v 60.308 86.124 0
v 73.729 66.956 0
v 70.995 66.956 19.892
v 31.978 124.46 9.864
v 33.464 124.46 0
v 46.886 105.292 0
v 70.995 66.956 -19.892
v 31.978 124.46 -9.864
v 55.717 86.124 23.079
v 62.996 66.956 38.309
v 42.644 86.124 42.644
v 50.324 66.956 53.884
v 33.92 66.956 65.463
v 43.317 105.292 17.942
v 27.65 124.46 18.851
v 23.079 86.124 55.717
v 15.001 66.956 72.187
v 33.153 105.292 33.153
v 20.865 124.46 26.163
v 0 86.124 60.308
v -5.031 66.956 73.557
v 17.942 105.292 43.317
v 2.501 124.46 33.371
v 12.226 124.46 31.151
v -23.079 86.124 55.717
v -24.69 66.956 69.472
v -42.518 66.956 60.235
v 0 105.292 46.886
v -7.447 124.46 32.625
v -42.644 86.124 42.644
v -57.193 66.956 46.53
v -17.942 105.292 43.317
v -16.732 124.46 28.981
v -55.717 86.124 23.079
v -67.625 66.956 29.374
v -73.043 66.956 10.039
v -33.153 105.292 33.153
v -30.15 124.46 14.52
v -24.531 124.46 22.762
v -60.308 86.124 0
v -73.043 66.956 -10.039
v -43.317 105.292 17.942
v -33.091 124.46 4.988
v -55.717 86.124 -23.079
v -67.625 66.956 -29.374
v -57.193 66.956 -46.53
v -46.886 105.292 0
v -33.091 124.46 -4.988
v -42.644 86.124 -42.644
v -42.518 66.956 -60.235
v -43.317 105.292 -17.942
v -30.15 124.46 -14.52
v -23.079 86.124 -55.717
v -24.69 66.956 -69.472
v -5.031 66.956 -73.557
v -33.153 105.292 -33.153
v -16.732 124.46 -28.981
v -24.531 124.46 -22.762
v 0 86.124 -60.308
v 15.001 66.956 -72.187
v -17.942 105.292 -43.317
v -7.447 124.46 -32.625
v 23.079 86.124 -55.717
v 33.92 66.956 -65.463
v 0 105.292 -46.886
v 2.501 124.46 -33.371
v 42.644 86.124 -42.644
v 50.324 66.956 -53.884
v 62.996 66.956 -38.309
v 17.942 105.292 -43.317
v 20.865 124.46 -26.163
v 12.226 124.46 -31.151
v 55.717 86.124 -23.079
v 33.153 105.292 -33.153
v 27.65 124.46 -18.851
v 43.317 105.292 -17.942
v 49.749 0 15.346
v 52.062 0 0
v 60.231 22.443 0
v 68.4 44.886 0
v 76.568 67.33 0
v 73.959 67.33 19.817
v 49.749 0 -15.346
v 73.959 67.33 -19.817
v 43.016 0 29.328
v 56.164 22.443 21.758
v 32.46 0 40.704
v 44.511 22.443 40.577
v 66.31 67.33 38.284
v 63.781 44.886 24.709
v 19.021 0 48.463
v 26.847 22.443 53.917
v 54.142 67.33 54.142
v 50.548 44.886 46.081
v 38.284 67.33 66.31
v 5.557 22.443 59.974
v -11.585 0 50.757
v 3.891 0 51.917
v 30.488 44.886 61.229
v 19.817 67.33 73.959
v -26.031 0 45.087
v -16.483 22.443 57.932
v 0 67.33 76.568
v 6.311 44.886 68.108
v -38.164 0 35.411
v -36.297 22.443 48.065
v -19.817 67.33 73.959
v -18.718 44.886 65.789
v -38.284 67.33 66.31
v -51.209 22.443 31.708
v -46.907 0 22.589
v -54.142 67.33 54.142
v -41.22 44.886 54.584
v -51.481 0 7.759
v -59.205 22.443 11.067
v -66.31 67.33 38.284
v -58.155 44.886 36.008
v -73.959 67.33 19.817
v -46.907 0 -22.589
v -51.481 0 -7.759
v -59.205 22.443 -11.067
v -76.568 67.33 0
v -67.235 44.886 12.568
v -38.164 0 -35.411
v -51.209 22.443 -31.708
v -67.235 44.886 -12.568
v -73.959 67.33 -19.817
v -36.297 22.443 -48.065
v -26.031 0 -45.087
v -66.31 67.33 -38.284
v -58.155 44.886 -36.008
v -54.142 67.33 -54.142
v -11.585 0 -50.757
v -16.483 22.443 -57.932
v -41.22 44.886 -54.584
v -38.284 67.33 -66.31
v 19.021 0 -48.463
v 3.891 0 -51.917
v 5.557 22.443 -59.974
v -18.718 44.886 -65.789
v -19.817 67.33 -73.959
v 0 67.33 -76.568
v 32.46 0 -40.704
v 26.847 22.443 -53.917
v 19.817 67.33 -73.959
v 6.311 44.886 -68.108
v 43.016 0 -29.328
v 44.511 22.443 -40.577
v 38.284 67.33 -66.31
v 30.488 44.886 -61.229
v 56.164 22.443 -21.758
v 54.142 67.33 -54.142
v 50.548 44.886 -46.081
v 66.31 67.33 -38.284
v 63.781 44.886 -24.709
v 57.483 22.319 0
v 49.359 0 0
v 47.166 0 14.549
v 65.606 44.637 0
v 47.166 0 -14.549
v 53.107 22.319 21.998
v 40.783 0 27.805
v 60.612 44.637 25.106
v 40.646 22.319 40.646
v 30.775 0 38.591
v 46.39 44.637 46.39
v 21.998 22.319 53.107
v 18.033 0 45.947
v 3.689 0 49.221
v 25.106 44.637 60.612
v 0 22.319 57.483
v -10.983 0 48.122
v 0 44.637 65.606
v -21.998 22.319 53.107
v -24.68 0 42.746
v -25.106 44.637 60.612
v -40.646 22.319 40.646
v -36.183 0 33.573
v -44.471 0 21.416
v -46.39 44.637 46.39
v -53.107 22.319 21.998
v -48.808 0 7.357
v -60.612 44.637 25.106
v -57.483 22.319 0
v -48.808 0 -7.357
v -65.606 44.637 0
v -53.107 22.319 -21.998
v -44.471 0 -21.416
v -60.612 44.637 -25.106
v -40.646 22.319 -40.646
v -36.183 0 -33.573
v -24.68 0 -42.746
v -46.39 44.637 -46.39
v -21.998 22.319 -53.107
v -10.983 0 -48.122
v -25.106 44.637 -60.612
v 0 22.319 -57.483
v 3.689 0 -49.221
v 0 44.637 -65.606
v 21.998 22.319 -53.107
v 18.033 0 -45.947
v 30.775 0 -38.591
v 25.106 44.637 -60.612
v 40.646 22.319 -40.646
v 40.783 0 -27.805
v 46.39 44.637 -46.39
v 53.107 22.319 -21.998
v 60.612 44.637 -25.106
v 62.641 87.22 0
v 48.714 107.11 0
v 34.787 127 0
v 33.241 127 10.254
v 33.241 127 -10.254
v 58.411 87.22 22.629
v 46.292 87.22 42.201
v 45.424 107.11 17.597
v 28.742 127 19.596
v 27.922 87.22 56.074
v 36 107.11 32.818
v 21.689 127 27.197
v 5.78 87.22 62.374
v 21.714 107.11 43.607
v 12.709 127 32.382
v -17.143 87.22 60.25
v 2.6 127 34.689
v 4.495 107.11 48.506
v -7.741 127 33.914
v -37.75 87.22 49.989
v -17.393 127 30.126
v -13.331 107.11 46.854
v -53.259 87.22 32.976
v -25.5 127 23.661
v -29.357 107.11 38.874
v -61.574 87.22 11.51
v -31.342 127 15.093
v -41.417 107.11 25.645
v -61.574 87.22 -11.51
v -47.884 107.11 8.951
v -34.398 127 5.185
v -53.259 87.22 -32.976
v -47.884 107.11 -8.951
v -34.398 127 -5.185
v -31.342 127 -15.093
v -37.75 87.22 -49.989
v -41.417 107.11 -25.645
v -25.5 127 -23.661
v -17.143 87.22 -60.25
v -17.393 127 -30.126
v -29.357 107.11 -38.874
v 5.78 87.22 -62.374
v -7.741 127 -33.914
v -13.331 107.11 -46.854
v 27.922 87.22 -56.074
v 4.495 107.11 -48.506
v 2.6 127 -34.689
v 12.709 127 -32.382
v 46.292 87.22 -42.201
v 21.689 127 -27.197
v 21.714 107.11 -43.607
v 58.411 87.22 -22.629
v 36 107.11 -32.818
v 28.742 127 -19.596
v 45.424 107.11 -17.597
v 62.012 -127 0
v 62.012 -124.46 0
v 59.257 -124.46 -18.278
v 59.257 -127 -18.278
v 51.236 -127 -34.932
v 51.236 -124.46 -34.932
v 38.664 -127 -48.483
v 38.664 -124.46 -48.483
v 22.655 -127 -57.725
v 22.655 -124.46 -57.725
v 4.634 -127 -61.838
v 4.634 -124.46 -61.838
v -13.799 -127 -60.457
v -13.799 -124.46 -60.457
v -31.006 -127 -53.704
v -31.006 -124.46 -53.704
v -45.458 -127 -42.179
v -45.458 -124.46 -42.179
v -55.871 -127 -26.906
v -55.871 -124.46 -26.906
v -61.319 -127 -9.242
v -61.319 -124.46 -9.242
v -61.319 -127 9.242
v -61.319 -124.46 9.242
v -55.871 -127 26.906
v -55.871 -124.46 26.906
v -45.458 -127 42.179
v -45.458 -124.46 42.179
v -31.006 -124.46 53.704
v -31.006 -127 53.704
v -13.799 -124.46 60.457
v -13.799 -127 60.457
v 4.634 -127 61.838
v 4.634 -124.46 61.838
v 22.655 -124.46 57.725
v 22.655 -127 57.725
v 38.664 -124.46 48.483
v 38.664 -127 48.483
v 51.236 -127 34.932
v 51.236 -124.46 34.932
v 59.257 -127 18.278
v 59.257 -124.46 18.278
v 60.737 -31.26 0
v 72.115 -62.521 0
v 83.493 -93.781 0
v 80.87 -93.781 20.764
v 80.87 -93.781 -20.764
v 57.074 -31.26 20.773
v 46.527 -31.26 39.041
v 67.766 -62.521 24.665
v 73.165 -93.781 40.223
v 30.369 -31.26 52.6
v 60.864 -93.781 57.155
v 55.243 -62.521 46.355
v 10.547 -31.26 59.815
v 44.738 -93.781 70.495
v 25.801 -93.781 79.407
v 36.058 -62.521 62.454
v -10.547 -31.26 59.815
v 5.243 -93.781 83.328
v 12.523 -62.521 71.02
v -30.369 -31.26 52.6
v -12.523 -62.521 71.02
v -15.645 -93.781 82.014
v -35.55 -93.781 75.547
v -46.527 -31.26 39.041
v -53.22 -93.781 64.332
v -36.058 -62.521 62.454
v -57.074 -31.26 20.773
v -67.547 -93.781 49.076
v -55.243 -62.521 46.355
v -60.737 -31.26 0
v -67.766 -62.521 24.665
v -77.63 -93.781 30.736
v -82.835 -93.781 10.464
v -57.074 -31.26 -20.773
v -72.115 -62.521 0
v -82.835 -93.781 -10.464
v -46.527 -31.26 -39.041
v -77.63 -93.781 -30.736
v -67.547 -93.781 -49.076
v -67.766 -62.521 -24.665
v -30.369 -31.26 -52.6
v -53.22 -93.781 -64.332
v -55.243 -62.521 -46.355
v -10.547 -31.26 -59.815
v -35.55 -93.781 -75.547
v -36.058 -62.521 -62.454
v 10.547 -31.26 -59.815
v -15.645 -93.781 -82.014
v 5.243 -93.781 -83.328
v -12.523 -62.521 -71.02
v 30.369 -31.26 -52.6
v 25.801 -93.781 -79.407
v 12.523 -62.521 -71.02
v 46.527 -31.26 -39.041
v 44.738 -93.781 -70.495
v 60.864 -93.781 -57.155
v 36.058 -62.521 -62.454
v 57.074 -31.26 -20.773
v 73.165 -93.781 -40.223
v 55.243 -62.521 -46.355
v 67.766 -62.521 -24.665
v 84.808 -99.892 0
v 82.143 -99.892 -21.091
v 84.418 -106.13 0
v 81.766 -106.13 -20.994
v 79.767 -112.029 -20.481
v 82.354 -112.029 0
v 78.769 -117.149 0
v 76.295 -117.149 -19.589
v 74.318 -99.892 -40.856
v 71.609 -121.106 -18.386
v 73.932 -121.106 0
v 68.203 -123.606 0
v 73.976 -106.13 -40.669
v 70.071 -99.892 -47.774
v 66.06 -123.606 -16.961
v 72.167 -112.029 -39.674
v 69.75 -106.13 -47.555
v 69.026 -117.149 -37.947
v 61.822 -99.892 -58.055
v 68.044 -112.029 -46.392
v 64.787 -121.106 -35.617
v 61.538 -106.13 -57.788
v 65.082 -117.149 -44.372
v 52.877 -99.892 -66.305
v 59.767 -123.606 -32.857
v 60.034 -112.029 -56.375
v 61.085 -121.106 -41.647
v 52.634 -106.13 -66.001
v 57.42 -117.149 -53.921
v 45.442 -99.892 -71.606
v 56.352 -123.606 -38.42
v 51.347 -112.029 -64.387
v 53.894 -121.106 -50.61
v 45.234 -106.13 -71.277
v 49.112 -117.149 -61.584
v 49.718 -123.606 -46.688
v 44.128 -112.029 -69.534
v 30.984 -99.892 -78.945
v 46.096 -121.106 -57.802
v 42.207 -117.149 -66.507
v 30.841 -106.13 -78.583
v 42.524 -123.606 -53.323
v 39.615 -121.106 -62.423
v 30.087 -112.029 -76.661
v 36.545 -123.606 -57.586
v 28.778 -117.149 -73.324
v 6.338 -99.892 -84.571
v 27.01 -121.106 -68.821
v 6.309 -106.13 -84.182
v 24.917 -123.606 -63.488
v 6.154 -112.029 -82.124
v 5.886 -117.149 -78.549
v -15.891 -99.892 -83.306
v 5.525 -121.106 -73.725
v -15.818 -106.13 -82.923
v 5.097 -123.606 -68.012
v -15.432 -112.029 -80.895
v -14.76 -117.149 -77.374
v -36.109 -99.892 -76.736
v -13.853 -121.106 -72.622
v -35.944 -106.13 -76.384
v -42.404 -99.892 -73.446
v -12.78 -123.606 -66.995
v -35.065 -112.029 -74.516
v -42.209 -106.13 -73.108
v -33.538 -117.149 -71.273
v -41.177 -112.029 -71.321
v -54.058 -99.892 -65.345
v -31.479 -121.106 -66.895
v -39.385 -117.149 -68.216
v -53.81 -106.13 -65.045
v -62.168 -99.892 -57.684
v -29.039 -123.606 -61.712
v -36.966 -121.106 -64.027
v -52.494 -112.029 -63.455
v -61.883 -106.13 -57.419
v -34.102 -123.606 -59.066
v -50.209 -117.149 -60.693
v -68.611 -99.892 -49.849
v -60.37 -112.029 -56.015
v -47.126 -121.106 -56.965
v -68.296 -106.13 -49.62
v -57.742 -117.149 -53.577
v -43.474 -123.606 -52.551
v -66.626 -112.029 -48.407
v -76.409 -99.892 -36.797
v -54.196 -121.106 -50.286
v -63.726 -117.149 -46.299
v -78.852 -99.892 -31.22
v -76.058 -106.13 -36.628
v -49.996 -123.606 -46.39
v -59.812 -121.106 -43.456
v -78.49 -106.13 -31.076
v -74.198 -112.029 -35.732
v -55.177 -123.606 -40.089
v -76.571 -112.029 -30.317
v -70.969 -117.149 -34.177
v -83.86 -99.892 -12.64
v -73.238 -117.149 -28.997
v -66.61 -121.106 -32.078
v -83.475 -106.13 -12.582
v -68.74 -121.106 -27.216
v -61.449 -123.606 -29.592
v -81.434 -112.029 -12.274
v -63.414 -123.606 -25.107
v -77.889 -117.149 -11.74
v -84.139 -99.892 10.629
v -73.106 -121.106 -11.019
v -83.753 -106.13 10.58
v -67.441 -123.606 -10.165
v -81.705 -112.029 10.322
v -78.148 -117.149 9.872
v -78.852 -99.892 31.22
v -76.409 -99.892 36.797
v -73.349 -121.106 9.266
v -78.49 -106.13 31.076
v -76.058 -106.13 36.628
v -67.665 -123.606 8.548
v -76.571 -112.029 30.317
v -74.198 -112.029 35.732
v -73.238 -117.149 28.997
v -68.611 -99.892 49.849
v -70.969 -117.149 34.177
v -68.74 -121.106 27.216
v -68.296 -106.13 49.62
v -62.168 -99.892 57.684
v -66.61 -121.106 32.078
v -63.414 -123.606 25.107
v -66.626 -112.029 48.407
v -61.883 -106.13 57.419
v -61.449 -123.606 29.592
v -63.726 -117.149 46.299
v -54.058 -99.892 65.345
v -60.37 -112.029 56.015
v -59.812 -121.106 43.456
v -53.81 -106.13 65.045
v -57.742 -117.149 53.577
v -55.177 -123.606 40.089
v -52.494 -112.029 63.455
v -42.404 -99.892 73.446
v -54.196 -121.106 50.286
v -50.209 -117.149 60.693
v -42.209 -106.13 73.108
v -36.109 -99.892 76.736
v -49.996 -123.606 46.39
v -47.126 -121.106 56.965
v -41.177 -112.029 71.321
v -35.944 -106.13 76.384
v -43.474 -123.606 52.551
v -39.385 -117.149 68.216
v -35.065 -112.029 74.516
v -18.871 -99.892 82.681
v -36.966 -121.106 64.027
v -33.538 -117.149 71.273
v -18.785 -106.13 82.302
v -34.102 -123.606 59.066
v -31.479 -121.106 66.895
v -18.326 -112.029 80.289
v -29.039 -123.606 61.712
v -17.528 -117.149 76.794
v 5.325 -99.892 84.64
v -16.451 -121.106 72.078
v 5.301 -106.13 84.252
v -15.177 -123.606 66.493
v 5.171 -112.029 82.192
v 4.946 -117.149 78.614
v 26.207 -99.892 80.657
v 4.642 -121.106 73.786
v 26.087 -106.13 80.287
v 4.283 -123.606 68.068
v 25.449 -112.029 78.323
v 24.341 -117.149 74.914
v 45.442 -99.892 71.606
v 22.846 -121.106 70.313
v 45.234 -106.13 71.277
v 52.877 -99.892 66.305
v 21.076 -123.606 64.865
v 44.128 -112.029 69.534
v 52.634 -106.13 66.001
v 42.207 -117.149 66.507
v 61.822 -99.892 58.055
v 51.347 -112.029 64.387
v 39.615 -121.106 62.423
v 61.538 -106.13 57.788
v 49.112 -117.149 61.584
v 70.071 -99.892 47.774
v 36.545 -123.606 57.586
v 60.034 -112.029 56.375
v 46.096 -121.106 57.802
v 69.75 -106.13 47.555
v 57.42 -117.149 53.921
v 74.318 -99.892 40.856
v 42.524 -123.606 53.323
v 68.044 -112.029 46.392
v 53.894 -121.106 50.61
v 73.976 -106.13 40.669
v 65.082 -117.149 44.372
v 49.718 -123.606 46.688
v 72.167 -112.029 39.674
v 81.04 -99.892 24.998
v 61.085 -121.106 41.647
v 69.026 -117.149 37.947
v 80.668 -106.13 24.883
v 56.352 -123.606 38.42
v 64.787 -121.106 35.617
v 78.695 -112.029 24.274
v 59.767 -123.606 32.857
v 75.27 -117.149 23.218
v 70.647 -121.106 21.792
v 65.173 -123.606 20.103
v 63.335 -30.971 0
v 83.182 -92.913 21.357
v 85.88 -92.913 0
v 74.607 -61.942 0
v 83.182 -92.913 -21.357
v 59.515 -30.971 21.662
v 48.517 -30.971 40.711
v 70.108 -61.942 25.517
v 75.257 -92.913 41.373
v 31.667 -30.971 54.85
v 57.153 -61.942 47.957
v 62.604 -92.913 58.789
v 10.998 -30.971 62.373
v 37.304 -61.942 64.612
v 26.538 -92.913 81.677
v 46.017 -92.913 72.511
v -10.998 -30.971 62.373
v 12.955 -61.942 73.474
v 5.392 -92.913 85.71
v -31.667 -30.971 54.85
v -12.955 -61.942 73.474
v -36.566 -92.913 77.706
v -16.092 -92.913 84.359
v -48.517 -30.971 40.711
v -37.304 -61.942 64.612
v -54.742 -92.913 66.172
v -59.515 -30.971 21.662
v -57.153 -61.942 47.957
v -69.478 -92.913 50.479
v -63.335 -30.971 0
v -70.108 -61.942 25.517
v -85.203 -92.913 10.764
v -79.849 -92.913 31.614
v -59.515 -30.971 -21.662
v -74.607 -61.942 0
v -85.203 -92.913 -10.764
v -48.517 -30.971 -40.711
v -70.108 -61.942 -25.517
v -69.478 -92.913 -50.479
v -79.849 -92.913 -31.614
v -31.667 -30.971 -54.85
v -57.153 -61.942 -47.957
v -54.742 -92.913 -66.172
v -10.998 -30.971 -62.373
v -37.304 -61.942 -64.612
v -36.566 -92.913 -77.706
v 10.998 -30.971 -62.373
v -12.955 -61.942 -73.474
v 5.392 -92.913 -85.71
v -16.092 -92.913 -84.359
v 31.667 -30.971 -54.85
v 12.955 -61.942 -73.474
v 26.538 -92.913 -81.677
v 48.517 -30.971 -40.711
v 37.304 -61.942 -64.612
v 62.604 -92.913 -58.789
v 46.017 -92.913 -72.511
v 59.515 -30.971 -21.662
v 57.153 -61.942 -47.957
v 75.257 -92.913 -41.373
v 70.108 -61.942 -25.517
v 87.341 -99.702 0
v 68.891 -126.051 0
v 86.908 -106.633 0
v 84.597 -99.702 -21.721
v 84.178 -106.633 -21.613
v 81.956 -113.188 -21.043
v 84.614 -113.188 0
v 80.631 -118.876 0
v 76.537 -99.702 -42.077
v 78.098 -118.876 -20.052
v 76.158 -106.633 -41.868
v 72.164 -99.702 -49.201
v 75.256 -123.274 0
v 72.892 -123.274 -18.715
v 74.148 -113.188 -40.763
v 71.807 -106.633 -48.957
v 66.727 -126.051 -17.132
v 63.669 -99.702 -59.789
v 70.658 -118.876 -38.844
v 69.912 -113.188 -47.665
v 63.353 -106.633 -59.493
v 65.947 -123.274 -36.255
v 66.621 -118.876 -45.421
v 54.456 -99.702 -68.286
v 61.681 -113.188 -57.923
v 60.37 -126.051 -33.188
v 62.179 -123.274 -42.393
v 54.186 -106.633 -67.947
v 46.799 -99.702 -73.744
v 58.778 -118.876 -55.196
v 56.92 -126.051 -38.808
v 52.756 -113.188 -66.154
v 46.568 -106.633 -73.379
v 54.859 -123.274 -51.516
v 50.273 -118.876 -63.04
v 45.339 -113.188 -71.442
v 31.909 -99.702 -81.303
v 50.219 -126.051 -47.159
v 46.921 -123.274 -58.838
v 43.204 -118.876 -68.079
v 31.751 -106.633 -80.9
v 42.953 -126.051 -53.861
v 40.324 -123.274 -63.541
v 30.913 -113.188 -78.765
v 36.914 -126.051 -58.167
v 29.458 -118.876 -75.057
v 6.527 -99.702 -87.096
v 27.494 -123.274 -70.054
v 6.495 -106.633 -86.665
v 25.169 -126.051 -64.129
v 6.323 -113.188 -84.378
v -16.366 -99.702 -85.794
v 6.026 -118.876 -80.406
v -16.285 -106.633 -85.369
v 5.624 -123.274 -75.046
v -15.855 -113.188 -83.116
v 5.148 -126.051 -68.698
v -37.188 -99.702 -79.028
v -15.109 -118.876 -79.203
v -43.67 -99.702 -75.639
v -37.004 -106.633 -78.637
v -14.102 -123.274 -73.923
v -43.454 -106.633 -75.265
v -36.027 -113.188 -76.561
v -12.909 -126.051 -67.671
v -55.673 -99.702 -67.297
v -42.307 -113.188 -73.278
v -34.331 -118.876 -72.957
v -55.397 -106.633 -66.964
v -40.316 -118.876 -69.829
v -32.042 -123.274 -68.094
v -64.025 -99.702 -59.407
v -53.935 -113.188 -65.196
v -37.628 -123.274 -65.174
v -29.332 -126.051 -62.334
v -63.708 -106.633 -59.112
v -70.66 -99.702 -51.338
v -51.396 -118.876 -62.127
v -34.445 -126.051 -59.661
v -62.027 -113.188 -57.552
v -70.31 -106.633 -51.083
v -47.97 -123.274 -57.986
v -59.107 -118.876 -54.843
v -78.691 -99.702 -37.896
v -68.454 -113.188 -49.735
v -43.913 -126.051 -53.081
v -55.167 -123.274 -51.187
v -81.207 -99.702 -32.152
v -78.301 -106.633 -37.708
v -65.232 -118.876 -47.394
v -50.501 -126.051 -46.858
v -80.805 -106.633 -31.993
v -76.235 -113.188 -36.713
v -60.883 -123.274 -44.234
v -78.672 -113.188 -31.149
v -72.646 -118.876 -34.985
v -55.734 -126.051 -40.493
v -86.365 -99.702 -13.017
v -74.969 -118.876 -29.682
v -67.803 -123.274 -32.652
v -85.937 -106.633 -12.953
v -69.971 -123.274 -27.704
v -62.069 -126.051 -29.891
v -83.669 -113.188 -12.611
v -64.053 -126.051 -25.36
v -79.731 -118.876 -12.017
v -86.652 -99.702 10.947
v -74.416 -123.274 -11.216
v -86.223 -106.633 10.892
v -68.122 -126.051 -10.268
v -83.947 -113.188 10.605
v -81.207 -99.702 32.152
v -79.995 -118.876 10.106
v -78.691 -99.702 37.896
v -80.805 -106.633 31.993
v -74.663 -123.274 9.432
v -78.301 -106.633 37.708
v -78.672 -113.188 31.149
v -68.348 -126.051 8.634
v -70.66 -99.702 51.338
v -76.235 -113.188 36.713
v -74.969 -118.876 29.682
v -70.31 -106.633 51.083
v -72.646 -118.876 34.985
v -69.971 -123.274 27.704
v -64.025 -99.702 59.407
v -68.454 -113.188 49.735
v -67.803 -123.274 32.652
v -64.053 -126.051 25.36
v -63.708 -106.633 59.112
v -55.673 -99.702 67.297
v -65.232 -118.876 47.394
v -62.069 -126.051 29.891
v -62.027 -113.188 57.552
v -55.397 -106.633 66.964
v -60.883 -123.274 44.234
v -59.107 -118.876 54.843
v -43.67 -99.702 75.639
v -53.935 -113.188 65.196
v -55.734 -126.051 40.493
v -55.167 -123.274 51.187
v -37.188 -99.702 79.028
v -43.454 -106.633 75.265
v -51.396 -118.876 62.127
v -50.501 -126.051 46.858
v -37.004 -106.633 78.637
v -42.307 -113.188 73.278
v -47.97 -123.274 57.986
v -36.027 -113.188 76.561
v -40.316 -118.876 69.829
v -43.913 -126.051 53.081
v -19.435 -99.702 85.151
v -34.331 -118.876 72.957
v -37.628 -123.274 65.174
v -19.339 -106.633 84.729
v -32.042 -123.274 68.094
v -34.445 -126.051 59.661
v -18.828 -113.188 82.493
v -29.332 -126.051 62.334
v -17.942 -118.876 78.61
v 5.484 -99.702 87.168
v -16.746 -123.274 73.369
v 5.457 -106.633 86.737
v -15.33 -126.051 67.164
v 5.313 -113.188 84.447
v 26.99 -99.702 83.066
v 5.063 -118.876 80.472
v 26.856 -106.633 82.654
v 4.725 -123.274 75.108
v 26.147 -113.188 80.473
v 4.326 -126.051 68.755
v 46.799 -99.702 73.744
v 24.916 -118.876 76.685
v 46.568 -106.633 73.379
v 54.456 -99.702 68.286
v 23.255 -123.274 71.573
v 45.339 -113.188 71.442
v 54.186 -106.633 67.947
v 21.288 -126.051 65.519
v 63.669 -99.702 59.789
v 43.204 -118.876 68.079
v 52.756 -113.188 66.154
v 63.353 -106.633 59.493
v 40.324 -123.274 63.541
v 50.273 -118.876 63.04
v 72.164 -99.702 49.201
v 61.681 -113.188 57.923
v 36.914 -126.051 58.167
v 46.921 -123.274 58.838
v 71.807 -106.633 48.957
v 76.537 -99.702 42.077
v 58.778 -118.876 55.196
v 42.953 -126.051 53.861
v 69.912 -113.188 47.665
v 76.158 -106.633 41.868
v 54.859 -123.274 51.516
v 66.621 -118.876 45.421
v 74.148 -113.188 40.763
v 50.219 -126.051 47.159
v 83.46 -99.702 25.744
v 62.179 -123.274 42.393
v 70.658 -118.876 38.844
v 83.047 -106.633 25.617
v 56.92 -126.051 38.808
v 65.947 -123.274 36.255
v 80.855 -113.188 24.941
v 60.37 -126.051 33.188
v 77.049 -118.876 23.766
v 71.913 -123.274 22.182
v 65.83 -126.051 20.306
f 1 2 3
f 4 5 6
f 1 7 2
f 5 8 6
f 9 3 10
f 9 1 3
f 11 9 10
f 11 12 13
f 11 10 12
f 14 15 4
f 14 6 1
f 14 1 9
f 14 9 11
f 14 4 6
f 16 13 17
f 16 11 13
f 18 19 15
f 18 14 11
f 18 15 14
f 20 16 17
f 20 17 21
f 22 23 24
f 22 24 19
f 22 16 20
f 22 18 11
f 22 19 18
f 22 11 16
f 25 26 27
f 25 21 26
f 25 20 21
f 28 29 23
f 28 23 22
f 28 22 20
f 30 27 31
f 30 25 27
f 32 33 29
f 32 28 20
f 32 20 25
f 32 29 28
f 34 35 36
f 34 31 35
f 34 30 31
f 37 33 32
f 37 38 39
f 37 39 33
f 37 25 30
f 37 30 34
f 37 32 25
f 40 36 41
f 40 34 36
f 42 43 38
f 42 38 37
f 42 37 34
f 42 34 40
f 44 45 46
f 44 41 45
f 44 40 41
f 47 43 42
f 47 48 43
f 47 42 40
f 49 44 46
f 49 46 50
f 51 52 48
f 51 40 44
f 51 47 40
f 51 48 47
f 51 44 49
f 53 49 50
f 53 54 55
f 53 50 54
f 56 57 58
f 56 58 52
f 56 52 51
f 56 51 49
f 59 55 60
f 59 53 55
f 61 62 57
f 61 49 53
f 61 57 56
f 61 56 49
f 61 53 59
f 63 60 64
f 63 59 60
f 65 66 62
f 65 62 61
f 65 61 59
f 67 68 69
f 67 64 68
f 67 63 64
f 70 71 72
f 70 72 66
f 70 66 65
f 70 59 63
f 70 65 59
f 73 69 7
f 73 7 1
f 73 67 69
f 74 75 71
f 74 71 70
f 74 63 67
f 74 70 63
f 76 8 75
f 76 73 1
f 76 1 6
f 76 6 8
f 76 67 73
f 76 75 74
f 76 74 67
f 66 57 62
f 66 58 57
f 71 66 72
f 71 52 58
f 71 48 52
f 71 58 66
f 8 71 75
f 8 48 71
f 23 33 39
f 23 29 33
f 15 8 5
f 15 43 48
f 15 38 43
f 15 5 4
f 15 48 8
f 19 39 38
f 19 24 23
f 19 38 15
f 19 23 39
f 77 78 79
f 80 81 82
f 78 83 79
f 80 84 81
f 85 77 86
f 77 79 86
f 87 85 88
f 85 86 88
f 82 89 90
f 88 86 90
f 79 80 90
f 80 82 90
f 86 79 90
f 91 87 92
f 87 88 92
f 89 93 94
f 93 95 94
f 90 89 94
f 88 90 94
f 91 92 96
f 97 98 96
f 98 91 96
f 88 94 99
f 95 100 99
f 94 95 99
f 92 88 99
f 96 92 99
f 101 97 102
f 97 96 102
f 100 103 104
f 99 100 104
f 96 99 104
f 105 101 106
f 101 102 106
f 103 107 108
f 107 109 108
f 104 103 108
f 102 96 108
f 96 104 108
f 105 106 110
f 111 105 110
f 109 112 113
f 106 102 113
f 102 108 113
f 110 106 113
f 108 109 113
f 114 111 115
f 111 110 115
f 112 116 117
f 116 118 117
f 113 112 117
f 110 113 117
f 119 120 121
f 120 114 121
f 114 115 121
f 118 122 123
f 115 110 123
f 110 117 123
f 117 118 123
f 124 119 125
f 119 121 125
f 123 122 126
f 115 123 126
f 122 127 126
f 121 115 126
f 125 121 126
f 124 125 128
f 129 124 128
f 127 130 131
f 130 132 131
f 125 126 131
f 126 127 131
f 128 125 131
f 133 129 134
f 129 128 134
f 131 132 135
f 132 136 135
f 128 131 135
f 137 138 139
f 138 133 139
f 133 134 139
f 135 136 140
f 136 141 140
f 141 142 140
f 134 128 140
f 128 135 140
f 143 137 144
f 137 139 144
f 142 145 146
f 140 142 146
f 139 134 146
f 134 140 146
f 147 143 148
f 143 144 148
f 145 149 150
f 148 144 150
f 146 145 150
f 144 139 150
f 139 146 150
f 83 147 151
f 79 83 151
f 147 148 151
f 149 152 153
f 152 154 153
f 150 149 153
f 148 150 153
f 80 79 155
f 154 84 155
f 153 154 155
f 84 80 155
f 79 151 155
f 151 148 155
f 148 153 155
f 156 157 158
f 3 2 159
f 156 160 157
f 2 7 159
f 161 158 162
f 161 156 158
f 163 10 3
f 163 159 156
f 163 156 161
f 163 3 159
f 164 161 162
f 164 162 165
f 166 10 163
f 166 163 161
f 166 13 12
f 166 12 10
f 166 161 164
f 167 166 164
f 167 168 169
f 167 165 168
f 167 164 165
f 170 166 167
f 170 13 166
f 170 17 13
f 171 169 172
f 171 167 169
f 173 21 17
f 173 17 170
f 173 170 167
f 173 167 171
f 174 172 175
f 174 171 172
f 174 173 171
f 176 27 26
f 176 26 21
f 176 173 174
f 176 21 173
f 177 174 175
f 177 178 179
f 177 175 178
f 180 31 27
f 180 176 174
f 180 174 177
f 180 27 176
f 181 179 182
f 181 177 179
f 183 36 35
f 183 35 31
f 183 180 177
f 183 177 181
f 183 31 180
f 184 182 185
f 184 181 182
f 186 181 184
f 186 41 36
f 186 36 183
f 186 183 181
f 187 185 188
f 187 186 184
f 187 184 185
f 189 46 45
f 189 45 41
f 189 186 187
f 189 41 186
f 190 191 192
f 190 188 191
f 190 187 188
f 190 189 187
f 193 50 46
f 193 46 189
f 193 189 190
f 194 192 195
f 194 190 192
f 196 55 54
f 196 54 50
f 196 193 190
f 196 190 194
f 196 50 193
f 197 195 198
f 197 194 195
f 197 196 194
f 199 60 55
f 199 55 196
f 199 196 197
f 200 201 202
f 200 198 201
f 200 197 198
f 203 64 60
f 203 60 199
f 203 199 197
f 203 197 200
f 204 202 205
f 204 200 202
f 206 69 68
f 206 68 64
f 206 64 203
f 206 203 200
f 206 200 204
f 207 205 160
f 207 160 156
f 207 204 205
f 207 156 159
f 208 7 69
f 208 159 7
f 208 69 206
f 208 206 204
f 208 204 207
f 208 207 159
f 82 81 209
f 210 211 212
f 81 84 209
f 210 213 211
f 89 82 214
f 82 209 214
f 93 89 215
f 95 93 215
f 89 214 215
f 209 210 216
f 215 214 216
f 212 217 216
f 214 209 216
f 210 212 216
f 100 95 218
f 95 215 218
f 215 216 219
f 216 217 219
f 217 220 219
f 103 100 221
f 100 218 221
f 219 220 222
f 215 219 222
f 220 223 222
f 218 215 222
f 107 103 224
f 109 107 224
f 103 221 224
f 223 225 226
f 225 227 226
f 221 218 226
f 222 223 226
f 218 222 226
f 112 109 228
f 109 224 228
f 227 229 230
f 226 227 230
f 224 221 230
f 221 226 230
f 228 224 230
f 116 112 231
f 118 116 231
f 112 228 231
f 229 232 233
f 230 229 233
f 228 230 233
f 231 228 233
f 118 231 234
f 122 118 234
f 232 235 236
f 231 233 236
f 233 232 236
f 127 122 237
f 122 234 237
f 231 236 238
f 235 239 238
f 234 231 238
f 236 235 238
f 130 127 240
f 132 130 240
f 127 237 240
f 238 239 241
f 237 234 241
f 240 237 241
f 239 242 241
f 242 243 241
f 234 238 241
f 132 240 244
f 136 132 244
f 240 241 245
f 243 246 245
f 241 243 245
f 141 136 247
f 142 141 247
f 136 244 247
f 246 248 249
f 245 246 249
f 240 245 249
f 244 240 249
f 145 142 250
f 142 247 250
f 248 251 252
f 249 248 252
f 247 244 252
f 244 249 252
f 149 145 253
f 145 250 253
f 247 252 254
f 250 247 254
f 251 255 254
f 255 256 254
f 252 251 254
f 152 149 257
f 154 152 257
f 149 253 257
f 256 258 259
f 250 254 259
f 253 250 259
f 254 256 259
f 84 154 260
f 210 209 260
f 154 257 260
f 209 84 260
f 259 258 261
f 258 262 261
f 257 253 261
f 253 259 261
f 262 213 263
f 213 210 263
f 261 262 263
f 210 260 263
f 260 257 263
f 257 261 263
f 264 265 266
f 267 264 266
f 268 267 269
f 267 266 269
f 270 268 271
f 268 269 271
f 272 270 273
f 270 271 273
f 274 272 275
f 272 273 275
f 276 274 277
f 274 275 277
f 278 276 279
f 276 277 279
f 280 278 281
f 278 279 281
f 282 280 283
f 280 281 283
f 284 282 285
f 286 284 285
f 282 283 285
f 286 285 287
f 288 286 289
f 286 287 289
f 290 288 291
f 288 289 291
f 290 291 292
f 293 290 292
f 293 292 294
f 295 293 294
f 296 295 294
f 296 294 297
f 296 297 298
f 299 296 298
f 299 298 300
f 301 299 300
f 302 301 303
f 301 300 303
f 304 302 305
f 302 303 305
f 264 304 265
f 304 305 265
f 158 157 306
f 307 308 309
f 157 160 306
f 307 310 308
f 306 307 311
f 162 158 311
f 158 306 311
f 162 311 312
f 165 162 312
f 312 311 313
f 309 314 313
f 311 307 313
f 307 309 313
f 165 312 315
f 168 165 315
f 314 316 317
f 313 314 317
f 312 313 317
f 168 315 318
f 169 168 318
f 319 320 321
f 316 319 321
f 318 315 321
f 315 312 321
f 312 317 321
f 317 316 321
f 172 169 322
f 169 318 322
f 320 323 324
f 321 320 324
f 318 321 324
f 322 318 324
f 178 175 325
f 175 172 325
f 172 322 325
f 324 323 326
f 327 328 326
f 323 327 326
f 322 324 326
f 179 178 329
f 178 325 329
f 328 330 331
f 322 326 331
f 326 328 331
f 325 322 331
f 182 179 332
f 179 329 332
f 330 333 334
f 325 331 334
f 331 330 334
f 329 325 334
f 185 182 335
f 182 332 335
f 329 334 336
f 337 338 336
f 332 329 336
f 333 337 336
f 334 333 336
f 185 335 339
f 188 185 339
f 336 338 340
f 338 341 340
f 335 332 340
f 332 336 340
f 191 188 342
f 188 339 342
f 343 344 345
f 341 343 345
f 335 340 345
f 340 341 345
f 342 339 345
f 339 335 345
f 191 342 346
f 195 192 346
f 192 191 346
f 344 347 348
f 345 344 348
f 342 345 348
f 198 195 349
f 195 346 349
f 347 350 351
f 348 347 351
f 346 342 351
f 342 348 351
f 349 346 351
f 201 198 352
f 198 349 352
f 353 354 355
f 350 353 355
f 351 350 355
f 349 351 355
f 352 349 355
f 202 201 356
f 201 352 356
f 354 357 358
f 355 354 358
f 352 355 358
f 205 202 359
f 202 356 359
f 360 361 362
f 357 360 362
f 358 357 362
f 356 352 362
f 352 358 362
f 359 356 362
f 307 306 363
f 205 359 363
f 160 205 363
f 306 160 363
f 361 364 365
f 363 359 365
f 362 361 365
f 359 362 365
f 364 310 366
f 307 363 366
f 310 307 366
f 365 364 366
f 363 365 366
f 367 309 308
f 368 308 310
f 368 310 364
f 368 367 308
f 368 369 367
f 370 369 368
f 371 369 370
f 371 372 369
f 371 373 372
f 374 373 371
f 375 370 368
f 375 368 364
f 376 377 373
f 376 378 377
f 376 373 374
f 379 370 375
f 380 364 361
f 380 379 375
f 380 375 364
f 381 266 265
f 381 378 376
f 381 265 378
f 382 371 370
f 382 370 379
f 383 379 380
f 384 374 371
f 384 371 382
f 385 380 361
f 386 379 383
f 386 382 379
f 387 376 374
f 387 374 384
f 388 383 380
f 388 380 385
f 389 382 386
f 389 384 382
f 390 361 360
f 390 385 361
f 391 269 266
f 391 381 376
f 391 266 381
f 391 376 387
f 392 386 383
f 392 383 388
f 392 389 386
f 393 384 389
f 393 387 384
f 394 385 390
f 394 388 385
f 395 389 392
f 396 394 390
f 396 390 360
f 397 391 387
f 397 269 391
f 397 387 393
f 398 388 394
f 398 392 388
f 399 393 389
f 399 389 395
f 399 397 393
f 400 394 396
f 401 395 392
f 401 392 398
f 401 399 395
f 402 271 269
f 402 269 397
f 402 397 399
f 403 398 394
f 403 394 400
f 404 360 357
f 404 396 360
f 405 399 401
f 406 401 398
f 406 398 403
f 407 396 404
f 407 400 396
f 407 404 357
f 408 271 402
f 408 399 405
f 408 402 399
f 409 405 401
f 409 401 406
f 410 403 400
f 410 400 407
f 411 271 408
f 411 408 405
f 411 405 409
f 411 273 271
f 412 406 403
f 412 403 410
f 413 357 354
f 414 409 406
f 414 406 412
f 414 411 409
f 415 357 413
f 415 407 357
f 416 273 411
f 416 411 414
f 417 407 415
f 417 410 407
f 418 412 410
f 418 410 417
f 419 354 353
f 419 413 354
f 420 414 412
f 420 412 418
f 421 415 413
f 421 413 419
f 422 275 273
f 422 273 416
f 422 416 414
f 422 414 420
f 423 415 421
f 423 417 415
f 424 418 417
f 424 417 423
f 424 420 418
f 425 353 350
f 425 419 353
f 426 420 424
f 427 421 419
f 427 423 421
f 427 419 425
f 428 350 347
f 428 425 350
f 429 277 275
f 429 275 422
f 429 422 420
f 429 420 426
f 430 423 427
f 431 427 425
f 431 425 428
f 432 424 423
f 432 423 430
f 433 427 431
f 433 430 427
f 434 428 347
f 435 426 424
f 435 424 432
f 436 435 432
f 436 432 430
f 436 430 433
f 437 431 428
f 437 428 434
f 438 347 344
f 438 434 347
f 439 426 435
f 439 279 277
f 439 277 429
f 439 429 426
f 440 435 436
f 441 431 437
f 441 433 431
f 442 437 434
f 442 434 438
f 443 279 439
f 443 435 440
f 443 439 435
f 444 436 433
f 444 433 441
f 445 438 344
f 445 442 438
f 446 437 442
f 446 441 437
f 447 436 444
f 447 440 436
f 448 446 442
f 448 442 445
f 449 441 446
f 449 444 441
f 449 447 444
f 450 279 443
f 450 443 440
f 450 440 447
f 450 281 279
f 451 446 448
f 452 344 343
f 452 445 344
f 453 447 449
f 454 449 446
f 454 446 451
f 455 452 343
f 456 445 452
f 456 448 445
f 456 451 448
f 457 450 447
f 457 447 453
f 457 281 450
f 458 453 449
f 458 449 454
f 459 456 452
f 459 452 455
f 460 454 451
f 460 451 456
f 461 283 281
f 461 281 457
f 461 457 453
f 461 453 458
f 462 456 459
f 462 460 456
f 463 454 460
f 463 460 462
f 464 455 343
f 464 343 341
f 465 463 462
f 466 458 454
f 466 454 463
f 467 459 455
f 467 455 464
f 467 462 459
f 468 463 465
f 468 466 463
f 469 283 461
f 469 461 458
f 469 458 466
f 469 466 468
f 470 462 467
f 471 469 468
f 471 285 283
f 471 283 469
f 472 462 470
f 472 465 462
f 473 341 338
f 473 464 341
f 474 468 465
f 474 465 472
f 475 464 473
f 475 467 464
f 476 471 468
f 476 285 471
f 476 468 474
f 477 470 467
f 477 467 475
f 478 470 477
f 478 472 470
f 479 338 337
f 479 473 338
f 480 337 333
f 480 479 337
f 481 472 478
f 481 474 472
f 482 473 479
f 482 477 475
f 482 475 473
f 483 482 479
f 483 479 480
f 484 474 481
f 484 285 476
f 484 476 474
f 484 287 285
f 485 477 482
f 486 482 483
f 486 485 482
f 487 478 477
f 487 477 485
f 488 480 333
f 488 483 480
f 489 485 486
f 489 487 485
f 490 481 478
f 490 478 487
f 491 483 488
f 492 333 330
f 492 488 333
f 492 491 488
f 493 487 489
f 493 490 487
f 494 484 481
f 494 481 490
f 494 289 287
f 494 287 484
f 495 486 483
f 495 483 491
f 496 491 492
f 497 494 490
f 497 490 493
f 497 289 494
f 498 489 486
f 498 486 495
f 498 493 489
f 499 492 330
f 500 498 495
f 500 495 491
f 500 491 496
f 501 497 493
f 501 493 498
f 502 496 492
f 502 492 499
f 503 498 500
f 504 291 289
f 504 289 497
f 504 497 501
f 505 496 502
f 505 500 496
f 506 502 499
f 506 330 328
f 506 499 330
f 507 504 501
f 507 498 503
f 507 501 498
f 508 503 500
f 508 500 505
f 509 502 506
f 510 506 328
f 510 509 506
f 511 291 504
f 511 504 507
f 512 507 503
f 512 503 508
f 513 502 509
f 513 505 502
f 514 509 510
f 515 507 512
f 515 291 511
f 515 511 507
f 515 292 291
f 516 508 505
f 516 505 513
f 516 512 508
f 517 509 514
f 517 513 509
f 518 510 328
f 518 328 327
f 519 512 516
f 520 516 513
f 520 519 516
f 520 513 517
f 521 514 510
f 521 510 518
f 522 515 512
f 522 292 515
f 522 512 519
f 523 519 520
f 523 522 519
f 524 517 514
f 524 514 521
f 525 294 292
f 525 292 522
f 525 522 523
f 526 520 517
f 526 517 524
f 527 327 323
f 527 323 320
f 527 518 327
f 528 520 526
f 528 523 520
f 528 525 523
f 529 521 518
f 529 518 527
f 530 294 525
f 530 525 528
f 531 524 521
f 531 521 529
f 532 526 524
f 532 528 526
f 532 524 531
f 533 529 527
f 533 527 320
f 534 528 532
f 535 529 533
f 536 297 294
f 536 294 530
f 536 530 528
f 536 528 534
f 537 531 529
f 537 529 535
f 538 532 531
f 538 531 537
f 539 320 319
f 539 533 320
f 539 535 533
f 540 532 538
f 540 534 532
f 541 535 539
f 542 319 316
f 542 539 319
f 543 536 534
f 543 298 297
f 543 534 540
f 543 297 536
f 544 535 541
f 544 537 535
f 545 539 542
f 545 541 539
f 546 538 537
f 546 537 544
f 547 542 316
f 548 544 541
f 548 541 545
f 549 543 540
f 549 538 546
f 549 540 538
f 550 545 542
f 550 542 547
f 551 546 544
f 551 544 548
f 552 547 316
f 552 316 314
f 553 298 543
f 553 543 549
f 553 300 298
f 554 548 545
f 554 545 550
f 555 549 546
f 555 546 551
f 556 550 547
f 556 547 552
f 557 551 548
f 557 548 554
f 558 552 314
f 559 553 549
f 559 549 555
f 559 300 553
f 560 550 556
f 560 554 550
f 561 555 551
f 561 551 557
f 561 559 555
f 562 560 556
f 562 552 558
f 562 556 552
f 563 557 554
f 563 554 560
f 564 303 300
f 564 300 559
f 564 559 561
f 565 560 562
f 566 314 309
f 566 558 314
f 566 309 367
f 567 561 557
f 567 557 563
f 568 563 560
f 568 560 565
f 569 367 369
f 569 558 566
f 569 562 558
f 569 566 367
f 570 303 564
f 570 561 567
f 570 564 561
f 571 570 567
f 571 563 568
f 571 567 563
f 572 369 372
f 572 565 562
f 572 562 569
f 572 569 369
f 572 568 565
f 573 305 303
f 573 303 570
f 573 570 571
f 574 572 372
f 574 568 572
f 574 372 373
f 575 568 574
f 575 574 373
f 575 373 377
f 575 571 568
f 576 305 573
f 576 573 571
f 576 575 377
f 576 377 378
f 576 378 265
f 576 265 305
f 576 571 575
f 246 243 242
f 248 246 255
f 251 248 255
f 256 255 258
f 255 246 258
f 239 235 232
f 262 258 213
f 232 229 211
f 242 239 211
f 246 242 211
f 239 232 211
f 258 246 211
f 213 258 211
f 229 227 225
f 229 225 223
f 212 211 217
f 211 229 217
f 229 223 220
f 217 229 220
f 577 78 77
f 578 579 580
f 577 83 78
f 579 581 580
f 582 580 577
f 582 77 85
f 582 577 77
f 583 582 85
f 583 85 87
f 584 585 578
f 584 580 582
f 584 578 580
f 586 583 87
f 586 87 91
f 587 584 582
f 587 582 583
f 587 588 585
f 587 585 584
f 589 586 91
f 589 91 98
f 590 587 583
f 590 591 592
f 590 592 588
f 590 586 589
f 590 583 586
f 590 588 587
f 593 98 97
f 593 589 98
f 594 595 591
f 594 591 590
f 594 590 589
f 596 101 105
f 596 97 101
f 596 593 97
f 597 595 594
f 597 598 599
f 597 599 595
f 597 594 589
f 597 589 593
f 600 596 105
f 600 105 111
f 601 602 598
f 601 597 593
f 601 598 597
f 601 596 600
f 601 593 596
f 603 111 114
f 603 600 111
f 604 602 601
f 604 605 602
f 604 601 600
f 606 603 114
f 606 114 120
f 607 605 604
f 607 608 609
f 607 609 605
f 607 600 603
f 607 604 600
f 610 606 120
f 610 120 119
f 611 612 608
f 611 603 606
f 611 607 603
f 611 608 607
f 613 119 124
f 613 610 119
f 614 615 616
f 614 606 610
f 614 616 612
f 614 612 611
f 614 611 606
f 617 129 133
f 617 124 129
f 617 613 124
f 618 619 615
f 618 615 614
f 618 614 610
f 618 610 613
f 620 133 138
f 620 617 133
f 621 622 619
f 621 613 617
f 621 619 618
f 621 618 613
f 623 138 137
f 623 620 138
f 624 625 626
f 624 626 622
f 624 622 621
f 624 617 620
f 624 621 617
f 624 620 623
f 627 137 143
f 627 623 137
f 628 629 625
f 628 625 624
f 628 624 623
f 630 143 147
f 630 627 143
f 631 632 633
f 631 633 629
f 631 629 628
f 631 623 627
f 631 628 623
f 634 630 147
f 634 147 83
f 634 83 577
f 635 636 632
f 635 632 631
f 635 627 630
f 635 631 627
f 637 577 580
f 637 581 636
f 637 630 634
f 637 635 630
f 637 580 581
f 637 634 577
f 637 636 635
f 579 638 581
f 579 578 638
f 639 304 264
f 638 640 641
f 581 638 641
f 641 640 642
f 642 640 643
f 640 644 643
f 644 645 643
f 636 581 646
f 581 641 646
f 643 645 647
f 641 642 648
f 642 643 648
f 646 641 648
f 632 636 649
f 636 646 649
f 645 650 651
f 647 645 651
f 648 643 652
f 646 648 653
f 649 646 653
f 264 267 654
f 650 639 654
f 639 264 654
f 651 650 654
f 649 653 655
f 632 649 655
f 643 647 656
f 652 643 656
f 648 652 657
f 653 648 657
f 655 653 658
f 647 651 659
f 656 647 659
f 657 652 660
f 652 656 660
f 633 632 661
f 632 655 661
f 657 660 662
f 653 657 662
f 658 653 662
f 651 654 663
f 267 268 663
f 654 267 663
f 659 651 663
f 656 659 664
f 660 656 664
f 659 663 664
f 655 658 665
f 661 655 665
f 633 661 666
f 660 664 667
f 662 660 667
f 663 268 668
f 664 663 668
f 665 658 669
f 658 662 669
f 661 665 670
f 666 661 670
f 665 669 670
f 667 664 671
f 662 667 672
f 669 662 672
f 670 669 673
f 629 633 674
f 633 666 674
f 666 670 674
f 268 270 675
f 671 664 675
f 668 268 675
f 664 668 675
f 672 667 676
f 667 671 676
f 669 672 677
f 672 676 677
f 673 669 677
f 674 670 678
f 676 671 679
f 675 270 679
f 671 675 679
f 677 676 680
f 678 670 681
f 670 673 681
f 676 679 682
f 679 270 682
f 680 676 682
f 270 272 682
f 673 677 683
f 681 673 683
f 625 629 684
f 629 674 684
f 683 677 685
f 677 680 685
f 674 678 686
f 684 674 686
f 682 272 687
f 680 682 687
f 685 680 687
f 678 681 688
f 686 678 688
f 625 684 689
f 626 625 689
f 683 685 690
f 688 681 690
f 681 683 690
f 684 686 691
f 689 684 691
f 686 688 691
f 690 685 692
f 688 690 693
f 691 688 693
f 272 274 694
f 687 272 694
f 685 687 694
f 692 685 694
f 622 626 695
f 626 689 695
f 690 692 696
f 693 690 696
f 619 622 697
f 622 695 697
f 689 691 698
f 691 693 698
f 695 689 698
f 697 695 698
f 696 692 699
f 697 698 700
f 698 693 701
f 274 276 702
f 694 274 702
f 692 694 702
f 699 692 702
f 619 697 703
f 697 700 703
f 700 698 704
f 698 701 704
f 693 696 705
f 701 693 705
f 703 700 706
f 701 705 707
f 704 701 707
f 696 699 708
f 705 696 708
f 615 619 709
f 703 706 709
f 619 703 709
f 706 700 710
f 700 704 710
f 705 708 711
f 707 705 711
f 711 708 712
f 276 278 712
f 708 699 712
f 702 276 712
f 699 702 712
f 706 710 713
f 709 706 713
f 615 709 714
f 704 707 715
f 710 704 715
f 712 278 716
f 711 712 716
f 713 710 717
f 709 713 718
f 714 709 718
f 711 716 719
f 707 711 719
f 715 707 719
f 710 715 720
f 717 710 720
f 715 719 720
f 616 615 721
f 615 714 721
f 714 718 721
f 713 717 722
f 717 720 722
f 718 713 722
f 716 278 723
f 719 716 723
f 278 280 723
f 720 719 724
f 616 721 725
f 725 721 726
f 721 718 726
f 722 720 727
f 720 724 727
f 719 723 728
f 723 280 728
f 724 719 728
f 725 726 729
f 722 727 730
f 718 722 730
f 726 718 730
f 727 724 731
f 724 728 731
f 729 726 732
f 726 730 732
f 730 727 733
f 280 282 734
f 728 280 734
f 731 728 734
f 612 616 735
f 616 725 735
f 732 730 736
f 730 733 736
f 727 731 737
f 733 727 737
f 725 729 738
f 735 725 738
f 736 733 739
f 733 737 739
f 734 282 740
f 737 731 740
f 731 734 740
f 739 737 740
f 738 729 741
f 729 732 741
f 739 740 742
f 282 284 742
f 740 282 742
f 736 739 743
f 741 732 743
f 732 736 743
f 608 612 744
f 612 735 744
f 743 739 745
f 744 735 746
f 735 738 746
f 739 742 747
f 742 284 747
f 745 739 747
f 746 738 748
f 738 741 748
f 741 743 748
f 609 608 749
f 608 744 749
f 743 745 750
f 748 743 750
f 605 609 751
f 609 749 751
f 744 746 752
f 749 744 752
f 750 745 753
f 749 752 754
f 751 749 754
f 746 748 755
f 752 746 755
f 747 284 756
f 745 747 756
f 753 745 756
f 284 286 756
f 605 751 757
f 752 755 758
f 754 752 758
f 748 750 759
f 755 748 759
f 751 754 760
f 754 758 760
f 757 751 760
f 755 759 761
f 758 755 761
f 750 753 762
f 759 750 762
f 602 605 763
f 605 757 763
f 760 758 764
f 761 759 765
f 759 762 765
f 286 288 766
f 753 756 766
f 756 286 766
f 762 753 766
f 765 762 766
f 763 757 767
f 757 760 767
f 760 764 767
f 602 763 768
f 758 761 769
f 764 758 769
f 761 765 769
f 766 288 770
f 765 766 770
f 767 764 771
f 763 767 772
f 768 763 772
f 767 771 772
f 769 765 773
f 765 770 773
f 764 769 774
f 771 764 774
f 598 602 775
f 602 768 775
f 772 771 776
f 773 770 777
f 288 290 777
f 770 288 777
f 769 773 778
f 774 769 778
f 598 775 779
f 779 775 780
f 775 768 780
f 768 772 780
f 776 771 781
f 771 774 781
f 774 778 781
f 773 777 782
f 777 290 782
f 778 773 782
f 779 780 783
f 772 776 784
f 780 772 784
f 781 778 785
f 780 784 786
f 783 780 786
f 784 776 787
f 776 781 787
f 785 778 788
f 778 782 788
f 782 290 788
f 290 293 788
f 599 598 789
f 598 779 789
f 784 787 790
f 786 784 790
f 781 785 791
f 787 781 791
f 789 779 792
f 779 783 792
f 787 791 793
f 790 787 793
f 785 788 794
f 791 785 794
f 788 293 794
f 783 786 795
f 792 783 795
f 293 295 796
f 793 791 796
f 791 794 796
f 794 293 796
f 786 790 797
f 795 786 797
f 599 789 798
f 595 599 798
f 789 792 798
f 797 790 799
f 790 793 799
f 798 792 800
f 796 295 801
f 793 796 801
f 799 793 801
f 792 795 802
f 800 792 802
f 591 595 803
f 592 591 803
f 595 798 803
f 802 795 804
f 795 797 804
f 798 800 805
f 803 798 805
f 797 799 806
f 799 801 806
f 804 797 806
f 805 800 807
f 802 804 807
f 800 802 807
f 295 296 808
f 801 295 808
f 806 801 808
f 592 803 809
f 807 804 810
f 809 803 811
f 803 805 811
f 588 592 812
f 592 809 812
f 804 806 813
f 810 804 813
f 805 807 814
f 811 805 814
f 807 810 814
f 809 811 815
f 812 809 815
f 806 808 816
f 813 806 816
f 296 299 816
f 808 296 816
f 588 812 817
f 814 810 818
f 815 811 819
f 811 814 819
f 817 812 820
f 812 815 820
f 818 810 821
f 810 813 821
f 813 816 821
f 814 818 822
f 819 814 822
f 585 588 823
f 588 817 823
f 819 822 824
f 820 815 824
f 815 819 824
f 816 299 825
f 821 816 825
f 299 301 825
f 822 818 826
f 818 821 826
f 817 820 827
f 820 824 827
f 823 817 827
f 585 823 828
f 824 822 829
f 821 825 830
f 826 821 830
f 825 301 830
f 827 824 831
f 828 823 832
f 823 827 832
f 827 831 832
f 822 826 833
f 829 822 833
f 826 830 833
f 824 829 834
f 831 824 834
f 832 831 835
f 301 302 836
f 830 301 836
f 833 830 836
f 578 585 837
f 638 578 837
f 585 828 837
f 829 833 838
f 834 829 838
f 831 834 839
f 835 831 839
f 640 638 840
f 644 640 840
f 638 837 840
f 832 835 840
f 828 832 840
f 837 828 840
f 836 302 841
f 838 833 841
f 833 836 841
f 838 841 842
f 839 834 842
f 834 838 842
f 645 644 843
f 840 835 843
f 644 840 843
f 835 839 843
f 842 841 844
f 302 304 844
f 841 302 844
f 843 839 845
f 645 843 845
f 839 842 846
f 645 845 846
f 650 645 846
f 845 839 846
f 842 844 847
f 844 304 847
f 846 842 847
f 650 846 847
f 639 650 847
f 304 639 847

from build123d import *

# Parameters (mm, degrees)
F0_R     = 52.0623730702
F1_DEPTH = 127
F1_TAPER = -20
F2_R     = 25.4
F3_SIZE  = 63.5
F4_T     = -2.54


# Not quite as in the source:
# - a shell that OpenCascade refuses in one call is made with other operations: the cavity is built on its own and cut out


with BuildPart() as f1:
    # F0 (on Front) → F1 (new body, symmetric)
    with BuildSketch(Plane.XZ):
        Circle(F0_R)
    extrude(amount=F1_DEPTH, both=True, taper=F1_TAPER)

    # F2
    f2_edges = [f1.edges().sort_by_distance(p)[0] for p in [
        (-98.286593, -127, 0),
    ]]
    fillet(f2_edges, radius=F2_R)

    # F3
    f3_edges = [f1.edges().sort_by_distance(p)[0] for p in [
        (-98.286593, 127, 0),
    ]]
    chamfer(f3_edges, length=F3_SIZE)

    # F4: a shell. OpenCascade refuses it in one call, so the cavity is built on its own and cut out:
    # the body offset inwards by the wall thickness, plus a prism from it out through each open face.
    f4_core = offset(f1.part, amount=F4_T, kind=Kind.INTERSECTION, mode=Mode.PRIVATE)
    f4_exits = [f4_core.faces().sort_by_distance(p)[0] for p in [
        (0, -124.46, 0),
    ]]
    add(f4_core, mode=Mode.SUBTRACT)
    extrude(f4_exits, amount=-F4_T, mode=Mode.SUBTRACT)


solid = f1.part
